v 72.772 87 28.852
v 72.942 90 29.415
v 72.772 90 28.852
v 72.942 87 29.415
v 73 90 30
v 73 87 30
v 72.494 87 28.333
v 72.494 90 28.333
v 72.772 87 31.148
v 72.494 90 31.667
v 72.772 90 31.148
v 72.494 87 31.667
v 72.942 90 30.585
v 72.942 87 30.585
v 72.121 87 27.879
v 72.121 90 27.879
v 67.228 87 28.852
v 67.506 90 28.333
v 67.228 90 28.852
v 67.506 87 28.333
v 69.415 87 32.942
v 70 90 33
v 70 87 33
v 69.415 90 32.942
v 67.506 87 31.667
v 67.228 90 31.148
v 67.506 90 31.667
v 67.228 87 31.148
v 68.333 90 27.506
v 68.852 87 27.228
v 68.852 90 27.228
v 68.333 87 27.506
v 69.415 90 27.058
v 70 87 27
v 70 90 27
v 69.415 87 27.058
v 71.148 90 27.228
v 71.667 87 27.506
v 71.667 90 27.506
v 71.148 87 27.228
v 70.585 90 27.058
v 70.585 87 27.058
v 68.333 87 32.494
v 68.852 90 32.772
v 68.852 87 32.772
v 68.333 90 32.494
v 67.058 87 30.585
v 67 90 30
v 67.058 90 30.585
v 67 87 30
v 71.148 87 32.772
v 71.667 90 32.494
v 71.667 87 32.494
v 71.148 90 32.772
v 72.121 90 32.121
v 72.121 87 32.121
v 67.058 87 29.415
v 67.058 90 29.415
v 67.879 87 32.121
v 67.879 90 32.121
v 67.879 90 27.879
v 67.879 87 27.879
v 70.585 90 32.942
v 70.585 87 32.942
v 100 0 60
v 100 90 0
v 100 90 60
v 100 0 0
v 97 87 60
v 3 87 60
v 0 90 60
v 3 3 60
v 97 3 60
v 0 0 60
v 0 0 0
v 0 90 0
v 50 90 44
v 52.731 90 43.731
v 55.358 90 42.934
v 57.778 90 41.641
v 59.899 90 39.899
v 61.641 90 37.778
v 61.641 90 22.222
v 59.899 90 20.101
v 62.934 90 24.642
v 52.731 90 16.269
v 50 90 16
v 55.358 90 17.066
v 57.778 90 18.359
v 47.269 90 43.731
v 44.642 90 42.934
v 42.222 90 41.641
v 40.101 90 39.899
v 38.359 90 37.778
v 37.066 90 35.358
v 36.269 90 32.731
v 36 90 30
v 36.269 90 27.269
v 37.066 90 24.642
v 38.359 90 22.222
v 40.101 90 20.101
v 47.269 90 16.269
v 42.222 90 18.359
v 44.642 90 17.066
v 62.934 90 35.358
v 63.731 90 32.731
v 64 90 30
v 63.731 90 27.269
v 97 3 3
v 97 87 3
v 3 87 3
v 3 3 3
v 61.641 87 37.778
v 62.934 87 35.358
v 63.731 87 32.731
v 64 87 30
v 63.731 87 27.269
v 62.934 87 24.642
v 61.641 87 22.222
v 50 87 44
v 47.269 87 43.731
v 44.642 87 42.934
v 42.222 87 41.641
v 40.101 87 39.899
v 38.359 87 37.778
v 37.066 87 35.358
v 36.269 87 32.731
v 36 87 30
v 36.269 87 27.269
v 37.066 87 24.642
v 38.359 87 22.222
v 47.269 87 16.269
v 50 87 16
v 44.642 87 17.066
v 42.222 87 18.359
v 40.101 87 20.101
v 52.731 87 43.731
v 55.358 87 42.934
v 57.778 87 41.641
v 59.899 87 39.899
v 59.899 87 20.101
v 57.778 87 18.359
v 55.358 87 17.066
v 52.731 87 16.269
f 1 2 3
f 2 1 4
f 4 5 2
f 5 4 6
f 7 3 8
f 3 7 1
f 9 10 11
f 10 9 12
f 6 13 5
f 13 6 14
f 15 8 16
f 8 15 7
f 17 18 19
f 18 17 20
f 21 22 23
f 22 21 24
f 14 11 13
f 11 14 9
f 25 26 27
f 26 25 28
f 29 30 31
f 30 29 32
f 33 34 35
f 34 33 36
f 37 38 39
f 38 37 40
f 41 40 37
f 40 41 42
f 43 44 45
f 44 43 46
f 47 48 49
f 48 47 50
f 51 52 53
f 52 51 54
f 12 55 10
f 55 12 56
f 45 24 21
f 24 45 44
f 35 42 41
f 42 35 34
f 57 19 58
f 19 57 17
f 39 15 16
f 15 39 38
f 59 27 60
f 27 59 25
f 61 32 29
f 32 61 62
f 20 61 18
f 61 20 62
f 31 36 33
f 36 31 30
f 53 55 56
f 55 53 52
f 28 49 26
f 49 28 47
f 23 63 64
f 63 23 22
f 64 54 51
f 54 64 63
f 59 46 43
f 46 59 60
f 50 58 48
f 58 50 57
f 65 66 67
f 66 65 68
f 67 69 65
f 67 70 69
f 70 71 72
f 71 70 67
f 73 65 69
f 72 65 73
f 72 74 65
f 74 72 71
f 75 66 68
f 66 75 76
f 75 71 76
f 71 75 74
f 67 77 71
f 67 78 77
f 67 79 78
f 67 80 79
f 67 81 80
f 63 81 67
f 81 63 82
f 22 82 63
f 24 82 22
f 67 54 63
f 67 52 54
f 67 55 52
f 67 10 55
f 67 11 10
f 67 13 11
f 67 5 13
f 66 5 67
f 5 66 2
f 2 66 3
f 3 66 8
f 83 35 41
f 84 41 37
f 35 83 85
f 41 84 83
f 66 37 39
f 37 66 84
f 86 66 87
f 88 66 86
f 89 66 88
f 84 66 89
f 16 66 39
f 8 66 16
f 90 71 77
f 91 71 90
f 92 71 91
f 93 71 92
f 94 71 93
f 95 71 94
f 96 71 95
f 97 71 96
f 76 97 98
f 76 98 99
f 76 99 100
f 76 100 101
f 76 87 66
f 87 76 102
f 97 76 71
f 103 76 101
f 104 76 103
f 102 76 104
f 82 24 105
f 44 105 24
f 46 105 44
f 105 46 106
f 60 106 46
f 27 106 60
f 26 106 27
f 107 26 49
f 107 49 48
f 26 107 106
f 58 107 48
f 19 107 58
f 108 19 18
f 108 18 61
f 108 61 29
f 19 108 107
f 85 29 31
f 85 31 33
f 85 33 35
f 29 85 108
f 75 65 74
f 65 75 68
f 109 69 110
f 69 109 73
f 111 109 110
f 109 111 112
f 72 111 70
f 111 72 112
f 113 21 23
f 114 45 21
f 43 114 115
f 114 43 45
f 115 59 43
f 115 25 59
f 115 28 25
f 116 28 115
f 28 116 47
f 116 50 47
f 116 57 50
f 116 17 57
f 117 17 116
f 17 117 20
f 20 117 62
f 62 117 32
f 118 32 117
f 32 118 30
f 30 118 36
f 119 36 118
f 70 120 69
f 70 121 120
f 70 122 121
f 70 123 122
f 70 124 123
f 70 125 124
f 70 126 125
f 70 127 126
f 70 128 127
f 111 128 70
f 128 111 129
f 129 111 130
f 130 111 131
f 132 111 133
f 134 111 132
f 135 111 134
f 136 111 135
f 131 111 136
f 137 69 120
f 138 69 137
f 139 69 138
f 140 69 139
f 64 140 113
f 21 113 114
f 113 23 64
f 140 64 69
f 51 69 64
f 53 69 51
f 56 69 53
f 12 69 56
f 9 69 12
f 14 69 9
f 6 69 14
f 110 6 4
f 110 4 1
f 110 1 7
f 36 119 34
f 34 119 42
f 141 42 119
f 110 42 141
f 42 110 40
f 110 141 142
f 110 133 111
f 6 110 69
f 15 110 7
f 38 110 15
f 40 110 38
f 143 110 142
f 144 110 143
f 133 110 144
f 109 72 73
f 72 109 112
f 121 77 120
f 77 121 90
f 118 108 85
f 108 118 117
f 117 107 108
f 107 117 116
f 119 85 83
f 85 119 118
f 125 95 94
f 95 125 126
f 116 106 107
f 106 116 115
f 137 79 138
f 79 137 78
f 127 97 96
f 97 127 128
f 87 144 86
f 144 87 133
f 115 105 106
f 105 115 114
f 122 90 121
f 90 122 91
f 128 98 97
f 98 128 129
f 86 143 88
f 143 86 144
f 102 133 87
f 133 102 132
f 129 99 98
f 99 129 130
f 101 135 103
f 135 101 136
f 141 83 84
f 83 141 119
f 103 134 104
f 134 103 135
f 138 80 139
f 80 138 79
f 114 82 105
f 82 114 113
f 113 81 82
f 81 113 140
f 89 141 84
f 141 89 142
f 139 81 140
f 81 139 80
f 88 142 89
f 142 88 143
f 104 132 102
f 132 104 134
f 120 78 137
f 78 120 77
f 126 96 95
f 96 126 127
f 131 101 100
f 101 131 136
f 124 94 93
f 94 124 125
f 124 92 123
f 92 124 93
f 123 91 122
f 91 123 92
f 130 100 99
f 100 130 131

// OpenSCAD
$fn = 32;

// ----------------------------------------------------------------------
// Vent box: roundvent enclosure
// ----------------------------------------------------------------------

// --- parameters (mm) ---
box_l = 100;              // box length, X
box_w = 90;               // box width, Y
box_h = 60;               // box height, Z
wall_t = 3;               // shell wall thickness
vent_d = 28;              // central vent diameter
ring_d = 6;               // ring hole diameter
n_ring = 6;               // holes in the ring
ring_r = 20;              // ring radius
fit_tol = 0.02;           // tolerance for press fits, mm
free_tol = 0.2;           // tolerance for clearance fits, mm

ring_step = 360 / n_ring;  // ring hole angular step

difference() {
  cube([box_l, box_w, box_h]);
  translate([wall_t, wall_t, wall_t])
    cube([box_l - 2 * wall_t, box_w - 2 * wall_t, box_h]);
  translate([box_l / 2, box_w - wall_t - 1, box_h / 2])
    rotate([-90, 0, 0]) cylinder(h = wall_t + 2, d = vent_d);
  for (i = [0 : n_ring - 1])
    translate([box_l / 2, box_w - wall_t - 1, box_h / 2])
      rotate([0, 0, i * ring_step])
        translate([ring_r, 0, 0]) rotate([-90, 0, 0])
          cylinder(h = wall_t + 2, d = ring_d);
}
